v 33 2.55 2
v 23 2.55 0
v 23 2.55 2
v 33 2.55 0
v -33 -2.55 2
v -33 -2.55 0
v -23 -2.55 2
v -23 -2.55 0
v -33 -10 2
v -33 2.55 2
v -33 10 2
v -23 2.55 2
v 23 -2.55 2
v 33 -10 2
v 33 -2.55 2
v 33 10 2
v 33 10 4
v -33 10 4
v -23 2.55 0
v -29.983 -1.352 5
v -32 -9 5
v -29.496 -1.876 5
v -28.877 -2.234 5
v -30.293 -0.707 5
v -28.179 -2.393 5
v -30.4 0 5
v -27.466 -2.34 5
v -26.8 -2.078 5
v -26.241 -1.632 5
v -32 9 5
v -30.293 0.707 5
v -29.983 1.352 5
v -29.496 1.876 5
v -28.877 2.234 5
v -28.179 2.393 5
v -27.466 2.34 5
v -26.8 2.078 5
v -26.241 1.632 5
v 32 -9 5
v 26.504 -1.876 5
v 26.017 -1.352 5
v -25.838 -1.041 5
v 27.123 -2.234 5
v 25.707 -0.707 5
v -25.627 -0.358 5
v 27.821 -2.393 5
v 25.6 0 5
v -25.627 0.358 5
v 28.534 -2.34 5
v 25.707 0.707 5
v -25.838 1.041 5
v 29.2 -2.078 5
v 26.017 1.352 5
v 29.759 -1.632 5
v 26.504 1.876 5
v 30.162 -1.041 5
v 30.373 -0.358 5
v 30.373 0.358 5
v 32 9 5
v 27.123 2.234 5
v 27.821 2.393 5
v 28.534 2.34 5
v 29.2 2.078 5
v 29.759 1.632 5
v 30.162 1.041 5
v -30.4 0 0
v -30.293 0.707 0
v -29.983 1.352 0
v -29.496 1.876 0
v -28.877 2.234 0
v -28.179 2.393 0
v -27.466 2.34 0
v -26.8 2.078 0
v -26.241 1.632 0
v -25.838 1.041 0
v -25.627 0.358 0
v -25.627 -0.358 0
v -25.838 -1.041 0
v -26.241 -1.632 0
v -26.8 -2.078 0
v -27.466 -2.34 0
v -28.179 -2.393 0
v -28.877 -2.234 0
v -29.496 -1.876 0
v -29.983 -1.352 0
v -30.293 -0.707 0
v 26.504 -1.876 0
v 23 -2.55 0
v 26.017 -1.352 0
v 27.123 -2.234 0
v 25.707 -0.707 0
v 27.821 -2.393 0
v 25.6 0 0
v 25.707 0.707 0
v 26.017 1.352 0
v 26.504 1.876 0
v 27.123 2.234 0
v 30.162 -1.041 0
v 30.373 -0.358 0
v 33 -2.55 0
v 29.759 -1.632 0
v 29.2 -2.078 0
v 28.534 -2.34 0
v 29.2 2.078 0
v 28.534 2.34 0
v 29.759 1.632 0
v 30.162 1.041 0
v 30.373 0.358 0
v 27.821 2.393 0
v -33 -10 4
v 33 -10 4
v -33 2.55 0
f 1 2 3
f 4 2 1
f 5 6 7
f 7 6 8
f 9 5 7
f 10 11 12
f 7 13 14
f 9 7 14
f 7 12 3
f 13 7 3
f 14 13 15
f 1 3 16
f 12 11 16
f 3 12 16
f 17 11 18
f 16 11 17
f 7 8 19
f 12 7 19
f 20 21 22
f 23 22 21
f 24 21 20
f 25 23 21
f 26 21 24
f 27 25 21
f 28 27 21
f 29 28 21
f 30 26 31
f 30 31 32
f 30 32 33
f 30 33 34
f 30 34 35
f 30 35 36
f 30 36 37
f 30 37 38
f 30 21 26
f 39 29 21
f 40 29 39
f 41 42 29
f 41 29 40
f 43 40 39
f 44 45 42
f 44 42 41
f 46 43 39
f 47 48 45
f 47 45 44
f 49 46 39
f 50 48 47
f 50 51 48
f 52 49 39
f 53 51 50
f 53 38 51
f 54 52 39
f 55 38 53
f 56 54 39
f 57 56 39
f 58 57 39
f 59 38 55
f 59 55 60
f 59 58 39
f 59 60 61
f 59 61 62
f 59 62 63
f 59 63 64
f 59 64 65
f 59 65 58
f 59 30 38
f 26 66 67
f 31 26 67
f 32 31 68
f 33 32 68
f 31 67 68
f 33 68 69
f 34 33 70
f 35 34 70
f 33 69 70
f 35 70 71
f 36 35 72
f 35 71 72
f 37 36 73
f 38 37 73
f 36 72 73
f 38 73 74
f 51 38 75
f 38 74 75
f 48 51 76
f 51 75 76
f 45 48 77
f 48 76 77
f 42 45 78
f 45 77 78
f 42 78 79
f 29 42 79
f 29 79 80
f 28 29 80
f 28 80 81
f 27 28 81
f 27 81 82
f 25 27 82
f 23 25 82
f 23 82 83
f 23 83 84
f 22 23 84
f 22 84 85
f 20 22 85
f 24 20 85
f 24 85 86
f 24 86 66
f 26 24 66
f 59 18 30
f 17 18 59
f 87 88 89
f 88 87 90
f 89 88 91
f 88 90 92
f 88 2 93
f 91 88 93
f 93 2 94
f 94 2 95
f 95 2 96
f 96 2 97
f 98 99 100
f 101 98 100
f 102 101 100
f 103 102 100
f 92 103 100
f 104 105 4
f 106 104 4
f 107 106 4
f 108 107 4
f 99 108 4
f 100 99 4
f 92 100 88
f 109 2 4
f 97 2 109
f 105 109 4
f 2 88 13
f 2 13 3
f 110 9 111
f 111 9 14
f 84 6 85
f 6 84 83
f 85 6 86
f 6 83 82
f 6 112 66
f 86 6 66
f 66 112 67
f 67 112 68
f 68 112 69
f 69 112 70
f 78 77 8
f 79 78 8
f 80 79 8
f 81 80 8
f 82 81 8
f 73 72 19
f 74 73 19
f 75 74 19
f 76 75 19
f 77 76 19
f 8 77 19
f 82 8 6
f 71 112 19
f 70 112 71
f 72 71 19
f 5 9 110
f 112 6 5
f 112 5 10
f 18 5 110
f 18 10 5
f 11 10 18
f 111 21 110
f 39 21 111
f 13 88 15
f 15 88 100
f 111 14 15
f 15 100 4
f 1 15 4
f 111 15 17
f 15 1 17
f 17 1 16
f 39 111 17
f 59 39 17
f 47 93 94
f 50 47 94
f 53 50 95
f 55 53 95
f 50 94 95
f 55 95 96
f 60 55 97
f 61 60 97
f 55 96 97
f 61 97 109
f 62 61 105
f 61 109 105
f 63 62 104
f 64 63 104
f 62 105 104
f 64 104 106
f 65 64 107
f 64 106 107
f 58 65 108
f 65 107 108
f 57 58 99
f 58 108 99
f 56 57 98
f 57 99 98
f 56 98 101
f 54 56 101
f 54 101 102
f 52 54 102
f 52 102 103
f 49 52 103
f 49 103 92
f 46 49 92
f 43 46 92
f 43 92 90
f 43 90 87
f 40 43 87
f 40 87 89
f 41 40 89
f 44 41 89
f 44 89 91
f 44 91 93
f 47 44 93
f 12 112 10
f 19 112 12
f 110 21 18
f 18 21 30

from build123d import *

# Parameters (mm, degrees)
SKETCH_1_W         = 10
SKETCH_1_H         = 5.1
EXTRUDE_1_DEPTH    = 2
EXTRUDE_1_2_DEPTH  = 2
SKETCH_2_W         = 66
SKETCH_2_H         = 20
EXTRUDE_2_DEPTH    = 3
HOLE_WIZARD_M4_1_D = 4.8
CHAMFER_1_SIZE     = 1


with BuildPart() as part:
    # 스케치1 → 보스-돌출1 (new body)
    with BuildSketch(Plane.XY):
        with Locations((28, 0)):
            Rectangle(SKETCH_1_W, SKETCH_1_H)
    extrude(amount=EXTRUDE_1_DEPTH)



with BuildPart() as body_2:
    # 스케치1 → Extrude 1 2 (new body)
    with BuildSketch(Plane.XY):
        with Locations((-28, 0)):
            Rectangle(SKETCH_1_W, SKETCH_1_H)
    extrude(amount=EXTRUDE_1_2_DEPTH)


with BuildPart() as part_1:
    add(part.part)

    add(body_2.part)  # 보스-돌출2 merges body 2
    # 스케치2 → 보스-돌출2 (add)
    with BuildSketch(Plane.XY.offset(2)):
        Rectangle(SKETCH_2_W, SKETCH_2_H)
    extrude(amount=EXTRUDE_2_DEPTH)

    # M4 여유 구멍1 (through all)
    with Locations(Plane.XY.offset(5)):
        with Locations((-28, 0), (28, 0)):
            Hole(HOLE_WIZARD_M4_1_D / 2)

    # 모따기1
    chamfer_1_edges = [part_1.edges().sort_by_distance(p)[0] for p in [
        (-33, 0, 5),
        (0, -10, 5),
        (33, 0, 5),
        (0, 10, 5),
    ]]
    chamfer(chamfer_1_edges, length=CHAMFER_1_SIZE)


solid = part_1.part
